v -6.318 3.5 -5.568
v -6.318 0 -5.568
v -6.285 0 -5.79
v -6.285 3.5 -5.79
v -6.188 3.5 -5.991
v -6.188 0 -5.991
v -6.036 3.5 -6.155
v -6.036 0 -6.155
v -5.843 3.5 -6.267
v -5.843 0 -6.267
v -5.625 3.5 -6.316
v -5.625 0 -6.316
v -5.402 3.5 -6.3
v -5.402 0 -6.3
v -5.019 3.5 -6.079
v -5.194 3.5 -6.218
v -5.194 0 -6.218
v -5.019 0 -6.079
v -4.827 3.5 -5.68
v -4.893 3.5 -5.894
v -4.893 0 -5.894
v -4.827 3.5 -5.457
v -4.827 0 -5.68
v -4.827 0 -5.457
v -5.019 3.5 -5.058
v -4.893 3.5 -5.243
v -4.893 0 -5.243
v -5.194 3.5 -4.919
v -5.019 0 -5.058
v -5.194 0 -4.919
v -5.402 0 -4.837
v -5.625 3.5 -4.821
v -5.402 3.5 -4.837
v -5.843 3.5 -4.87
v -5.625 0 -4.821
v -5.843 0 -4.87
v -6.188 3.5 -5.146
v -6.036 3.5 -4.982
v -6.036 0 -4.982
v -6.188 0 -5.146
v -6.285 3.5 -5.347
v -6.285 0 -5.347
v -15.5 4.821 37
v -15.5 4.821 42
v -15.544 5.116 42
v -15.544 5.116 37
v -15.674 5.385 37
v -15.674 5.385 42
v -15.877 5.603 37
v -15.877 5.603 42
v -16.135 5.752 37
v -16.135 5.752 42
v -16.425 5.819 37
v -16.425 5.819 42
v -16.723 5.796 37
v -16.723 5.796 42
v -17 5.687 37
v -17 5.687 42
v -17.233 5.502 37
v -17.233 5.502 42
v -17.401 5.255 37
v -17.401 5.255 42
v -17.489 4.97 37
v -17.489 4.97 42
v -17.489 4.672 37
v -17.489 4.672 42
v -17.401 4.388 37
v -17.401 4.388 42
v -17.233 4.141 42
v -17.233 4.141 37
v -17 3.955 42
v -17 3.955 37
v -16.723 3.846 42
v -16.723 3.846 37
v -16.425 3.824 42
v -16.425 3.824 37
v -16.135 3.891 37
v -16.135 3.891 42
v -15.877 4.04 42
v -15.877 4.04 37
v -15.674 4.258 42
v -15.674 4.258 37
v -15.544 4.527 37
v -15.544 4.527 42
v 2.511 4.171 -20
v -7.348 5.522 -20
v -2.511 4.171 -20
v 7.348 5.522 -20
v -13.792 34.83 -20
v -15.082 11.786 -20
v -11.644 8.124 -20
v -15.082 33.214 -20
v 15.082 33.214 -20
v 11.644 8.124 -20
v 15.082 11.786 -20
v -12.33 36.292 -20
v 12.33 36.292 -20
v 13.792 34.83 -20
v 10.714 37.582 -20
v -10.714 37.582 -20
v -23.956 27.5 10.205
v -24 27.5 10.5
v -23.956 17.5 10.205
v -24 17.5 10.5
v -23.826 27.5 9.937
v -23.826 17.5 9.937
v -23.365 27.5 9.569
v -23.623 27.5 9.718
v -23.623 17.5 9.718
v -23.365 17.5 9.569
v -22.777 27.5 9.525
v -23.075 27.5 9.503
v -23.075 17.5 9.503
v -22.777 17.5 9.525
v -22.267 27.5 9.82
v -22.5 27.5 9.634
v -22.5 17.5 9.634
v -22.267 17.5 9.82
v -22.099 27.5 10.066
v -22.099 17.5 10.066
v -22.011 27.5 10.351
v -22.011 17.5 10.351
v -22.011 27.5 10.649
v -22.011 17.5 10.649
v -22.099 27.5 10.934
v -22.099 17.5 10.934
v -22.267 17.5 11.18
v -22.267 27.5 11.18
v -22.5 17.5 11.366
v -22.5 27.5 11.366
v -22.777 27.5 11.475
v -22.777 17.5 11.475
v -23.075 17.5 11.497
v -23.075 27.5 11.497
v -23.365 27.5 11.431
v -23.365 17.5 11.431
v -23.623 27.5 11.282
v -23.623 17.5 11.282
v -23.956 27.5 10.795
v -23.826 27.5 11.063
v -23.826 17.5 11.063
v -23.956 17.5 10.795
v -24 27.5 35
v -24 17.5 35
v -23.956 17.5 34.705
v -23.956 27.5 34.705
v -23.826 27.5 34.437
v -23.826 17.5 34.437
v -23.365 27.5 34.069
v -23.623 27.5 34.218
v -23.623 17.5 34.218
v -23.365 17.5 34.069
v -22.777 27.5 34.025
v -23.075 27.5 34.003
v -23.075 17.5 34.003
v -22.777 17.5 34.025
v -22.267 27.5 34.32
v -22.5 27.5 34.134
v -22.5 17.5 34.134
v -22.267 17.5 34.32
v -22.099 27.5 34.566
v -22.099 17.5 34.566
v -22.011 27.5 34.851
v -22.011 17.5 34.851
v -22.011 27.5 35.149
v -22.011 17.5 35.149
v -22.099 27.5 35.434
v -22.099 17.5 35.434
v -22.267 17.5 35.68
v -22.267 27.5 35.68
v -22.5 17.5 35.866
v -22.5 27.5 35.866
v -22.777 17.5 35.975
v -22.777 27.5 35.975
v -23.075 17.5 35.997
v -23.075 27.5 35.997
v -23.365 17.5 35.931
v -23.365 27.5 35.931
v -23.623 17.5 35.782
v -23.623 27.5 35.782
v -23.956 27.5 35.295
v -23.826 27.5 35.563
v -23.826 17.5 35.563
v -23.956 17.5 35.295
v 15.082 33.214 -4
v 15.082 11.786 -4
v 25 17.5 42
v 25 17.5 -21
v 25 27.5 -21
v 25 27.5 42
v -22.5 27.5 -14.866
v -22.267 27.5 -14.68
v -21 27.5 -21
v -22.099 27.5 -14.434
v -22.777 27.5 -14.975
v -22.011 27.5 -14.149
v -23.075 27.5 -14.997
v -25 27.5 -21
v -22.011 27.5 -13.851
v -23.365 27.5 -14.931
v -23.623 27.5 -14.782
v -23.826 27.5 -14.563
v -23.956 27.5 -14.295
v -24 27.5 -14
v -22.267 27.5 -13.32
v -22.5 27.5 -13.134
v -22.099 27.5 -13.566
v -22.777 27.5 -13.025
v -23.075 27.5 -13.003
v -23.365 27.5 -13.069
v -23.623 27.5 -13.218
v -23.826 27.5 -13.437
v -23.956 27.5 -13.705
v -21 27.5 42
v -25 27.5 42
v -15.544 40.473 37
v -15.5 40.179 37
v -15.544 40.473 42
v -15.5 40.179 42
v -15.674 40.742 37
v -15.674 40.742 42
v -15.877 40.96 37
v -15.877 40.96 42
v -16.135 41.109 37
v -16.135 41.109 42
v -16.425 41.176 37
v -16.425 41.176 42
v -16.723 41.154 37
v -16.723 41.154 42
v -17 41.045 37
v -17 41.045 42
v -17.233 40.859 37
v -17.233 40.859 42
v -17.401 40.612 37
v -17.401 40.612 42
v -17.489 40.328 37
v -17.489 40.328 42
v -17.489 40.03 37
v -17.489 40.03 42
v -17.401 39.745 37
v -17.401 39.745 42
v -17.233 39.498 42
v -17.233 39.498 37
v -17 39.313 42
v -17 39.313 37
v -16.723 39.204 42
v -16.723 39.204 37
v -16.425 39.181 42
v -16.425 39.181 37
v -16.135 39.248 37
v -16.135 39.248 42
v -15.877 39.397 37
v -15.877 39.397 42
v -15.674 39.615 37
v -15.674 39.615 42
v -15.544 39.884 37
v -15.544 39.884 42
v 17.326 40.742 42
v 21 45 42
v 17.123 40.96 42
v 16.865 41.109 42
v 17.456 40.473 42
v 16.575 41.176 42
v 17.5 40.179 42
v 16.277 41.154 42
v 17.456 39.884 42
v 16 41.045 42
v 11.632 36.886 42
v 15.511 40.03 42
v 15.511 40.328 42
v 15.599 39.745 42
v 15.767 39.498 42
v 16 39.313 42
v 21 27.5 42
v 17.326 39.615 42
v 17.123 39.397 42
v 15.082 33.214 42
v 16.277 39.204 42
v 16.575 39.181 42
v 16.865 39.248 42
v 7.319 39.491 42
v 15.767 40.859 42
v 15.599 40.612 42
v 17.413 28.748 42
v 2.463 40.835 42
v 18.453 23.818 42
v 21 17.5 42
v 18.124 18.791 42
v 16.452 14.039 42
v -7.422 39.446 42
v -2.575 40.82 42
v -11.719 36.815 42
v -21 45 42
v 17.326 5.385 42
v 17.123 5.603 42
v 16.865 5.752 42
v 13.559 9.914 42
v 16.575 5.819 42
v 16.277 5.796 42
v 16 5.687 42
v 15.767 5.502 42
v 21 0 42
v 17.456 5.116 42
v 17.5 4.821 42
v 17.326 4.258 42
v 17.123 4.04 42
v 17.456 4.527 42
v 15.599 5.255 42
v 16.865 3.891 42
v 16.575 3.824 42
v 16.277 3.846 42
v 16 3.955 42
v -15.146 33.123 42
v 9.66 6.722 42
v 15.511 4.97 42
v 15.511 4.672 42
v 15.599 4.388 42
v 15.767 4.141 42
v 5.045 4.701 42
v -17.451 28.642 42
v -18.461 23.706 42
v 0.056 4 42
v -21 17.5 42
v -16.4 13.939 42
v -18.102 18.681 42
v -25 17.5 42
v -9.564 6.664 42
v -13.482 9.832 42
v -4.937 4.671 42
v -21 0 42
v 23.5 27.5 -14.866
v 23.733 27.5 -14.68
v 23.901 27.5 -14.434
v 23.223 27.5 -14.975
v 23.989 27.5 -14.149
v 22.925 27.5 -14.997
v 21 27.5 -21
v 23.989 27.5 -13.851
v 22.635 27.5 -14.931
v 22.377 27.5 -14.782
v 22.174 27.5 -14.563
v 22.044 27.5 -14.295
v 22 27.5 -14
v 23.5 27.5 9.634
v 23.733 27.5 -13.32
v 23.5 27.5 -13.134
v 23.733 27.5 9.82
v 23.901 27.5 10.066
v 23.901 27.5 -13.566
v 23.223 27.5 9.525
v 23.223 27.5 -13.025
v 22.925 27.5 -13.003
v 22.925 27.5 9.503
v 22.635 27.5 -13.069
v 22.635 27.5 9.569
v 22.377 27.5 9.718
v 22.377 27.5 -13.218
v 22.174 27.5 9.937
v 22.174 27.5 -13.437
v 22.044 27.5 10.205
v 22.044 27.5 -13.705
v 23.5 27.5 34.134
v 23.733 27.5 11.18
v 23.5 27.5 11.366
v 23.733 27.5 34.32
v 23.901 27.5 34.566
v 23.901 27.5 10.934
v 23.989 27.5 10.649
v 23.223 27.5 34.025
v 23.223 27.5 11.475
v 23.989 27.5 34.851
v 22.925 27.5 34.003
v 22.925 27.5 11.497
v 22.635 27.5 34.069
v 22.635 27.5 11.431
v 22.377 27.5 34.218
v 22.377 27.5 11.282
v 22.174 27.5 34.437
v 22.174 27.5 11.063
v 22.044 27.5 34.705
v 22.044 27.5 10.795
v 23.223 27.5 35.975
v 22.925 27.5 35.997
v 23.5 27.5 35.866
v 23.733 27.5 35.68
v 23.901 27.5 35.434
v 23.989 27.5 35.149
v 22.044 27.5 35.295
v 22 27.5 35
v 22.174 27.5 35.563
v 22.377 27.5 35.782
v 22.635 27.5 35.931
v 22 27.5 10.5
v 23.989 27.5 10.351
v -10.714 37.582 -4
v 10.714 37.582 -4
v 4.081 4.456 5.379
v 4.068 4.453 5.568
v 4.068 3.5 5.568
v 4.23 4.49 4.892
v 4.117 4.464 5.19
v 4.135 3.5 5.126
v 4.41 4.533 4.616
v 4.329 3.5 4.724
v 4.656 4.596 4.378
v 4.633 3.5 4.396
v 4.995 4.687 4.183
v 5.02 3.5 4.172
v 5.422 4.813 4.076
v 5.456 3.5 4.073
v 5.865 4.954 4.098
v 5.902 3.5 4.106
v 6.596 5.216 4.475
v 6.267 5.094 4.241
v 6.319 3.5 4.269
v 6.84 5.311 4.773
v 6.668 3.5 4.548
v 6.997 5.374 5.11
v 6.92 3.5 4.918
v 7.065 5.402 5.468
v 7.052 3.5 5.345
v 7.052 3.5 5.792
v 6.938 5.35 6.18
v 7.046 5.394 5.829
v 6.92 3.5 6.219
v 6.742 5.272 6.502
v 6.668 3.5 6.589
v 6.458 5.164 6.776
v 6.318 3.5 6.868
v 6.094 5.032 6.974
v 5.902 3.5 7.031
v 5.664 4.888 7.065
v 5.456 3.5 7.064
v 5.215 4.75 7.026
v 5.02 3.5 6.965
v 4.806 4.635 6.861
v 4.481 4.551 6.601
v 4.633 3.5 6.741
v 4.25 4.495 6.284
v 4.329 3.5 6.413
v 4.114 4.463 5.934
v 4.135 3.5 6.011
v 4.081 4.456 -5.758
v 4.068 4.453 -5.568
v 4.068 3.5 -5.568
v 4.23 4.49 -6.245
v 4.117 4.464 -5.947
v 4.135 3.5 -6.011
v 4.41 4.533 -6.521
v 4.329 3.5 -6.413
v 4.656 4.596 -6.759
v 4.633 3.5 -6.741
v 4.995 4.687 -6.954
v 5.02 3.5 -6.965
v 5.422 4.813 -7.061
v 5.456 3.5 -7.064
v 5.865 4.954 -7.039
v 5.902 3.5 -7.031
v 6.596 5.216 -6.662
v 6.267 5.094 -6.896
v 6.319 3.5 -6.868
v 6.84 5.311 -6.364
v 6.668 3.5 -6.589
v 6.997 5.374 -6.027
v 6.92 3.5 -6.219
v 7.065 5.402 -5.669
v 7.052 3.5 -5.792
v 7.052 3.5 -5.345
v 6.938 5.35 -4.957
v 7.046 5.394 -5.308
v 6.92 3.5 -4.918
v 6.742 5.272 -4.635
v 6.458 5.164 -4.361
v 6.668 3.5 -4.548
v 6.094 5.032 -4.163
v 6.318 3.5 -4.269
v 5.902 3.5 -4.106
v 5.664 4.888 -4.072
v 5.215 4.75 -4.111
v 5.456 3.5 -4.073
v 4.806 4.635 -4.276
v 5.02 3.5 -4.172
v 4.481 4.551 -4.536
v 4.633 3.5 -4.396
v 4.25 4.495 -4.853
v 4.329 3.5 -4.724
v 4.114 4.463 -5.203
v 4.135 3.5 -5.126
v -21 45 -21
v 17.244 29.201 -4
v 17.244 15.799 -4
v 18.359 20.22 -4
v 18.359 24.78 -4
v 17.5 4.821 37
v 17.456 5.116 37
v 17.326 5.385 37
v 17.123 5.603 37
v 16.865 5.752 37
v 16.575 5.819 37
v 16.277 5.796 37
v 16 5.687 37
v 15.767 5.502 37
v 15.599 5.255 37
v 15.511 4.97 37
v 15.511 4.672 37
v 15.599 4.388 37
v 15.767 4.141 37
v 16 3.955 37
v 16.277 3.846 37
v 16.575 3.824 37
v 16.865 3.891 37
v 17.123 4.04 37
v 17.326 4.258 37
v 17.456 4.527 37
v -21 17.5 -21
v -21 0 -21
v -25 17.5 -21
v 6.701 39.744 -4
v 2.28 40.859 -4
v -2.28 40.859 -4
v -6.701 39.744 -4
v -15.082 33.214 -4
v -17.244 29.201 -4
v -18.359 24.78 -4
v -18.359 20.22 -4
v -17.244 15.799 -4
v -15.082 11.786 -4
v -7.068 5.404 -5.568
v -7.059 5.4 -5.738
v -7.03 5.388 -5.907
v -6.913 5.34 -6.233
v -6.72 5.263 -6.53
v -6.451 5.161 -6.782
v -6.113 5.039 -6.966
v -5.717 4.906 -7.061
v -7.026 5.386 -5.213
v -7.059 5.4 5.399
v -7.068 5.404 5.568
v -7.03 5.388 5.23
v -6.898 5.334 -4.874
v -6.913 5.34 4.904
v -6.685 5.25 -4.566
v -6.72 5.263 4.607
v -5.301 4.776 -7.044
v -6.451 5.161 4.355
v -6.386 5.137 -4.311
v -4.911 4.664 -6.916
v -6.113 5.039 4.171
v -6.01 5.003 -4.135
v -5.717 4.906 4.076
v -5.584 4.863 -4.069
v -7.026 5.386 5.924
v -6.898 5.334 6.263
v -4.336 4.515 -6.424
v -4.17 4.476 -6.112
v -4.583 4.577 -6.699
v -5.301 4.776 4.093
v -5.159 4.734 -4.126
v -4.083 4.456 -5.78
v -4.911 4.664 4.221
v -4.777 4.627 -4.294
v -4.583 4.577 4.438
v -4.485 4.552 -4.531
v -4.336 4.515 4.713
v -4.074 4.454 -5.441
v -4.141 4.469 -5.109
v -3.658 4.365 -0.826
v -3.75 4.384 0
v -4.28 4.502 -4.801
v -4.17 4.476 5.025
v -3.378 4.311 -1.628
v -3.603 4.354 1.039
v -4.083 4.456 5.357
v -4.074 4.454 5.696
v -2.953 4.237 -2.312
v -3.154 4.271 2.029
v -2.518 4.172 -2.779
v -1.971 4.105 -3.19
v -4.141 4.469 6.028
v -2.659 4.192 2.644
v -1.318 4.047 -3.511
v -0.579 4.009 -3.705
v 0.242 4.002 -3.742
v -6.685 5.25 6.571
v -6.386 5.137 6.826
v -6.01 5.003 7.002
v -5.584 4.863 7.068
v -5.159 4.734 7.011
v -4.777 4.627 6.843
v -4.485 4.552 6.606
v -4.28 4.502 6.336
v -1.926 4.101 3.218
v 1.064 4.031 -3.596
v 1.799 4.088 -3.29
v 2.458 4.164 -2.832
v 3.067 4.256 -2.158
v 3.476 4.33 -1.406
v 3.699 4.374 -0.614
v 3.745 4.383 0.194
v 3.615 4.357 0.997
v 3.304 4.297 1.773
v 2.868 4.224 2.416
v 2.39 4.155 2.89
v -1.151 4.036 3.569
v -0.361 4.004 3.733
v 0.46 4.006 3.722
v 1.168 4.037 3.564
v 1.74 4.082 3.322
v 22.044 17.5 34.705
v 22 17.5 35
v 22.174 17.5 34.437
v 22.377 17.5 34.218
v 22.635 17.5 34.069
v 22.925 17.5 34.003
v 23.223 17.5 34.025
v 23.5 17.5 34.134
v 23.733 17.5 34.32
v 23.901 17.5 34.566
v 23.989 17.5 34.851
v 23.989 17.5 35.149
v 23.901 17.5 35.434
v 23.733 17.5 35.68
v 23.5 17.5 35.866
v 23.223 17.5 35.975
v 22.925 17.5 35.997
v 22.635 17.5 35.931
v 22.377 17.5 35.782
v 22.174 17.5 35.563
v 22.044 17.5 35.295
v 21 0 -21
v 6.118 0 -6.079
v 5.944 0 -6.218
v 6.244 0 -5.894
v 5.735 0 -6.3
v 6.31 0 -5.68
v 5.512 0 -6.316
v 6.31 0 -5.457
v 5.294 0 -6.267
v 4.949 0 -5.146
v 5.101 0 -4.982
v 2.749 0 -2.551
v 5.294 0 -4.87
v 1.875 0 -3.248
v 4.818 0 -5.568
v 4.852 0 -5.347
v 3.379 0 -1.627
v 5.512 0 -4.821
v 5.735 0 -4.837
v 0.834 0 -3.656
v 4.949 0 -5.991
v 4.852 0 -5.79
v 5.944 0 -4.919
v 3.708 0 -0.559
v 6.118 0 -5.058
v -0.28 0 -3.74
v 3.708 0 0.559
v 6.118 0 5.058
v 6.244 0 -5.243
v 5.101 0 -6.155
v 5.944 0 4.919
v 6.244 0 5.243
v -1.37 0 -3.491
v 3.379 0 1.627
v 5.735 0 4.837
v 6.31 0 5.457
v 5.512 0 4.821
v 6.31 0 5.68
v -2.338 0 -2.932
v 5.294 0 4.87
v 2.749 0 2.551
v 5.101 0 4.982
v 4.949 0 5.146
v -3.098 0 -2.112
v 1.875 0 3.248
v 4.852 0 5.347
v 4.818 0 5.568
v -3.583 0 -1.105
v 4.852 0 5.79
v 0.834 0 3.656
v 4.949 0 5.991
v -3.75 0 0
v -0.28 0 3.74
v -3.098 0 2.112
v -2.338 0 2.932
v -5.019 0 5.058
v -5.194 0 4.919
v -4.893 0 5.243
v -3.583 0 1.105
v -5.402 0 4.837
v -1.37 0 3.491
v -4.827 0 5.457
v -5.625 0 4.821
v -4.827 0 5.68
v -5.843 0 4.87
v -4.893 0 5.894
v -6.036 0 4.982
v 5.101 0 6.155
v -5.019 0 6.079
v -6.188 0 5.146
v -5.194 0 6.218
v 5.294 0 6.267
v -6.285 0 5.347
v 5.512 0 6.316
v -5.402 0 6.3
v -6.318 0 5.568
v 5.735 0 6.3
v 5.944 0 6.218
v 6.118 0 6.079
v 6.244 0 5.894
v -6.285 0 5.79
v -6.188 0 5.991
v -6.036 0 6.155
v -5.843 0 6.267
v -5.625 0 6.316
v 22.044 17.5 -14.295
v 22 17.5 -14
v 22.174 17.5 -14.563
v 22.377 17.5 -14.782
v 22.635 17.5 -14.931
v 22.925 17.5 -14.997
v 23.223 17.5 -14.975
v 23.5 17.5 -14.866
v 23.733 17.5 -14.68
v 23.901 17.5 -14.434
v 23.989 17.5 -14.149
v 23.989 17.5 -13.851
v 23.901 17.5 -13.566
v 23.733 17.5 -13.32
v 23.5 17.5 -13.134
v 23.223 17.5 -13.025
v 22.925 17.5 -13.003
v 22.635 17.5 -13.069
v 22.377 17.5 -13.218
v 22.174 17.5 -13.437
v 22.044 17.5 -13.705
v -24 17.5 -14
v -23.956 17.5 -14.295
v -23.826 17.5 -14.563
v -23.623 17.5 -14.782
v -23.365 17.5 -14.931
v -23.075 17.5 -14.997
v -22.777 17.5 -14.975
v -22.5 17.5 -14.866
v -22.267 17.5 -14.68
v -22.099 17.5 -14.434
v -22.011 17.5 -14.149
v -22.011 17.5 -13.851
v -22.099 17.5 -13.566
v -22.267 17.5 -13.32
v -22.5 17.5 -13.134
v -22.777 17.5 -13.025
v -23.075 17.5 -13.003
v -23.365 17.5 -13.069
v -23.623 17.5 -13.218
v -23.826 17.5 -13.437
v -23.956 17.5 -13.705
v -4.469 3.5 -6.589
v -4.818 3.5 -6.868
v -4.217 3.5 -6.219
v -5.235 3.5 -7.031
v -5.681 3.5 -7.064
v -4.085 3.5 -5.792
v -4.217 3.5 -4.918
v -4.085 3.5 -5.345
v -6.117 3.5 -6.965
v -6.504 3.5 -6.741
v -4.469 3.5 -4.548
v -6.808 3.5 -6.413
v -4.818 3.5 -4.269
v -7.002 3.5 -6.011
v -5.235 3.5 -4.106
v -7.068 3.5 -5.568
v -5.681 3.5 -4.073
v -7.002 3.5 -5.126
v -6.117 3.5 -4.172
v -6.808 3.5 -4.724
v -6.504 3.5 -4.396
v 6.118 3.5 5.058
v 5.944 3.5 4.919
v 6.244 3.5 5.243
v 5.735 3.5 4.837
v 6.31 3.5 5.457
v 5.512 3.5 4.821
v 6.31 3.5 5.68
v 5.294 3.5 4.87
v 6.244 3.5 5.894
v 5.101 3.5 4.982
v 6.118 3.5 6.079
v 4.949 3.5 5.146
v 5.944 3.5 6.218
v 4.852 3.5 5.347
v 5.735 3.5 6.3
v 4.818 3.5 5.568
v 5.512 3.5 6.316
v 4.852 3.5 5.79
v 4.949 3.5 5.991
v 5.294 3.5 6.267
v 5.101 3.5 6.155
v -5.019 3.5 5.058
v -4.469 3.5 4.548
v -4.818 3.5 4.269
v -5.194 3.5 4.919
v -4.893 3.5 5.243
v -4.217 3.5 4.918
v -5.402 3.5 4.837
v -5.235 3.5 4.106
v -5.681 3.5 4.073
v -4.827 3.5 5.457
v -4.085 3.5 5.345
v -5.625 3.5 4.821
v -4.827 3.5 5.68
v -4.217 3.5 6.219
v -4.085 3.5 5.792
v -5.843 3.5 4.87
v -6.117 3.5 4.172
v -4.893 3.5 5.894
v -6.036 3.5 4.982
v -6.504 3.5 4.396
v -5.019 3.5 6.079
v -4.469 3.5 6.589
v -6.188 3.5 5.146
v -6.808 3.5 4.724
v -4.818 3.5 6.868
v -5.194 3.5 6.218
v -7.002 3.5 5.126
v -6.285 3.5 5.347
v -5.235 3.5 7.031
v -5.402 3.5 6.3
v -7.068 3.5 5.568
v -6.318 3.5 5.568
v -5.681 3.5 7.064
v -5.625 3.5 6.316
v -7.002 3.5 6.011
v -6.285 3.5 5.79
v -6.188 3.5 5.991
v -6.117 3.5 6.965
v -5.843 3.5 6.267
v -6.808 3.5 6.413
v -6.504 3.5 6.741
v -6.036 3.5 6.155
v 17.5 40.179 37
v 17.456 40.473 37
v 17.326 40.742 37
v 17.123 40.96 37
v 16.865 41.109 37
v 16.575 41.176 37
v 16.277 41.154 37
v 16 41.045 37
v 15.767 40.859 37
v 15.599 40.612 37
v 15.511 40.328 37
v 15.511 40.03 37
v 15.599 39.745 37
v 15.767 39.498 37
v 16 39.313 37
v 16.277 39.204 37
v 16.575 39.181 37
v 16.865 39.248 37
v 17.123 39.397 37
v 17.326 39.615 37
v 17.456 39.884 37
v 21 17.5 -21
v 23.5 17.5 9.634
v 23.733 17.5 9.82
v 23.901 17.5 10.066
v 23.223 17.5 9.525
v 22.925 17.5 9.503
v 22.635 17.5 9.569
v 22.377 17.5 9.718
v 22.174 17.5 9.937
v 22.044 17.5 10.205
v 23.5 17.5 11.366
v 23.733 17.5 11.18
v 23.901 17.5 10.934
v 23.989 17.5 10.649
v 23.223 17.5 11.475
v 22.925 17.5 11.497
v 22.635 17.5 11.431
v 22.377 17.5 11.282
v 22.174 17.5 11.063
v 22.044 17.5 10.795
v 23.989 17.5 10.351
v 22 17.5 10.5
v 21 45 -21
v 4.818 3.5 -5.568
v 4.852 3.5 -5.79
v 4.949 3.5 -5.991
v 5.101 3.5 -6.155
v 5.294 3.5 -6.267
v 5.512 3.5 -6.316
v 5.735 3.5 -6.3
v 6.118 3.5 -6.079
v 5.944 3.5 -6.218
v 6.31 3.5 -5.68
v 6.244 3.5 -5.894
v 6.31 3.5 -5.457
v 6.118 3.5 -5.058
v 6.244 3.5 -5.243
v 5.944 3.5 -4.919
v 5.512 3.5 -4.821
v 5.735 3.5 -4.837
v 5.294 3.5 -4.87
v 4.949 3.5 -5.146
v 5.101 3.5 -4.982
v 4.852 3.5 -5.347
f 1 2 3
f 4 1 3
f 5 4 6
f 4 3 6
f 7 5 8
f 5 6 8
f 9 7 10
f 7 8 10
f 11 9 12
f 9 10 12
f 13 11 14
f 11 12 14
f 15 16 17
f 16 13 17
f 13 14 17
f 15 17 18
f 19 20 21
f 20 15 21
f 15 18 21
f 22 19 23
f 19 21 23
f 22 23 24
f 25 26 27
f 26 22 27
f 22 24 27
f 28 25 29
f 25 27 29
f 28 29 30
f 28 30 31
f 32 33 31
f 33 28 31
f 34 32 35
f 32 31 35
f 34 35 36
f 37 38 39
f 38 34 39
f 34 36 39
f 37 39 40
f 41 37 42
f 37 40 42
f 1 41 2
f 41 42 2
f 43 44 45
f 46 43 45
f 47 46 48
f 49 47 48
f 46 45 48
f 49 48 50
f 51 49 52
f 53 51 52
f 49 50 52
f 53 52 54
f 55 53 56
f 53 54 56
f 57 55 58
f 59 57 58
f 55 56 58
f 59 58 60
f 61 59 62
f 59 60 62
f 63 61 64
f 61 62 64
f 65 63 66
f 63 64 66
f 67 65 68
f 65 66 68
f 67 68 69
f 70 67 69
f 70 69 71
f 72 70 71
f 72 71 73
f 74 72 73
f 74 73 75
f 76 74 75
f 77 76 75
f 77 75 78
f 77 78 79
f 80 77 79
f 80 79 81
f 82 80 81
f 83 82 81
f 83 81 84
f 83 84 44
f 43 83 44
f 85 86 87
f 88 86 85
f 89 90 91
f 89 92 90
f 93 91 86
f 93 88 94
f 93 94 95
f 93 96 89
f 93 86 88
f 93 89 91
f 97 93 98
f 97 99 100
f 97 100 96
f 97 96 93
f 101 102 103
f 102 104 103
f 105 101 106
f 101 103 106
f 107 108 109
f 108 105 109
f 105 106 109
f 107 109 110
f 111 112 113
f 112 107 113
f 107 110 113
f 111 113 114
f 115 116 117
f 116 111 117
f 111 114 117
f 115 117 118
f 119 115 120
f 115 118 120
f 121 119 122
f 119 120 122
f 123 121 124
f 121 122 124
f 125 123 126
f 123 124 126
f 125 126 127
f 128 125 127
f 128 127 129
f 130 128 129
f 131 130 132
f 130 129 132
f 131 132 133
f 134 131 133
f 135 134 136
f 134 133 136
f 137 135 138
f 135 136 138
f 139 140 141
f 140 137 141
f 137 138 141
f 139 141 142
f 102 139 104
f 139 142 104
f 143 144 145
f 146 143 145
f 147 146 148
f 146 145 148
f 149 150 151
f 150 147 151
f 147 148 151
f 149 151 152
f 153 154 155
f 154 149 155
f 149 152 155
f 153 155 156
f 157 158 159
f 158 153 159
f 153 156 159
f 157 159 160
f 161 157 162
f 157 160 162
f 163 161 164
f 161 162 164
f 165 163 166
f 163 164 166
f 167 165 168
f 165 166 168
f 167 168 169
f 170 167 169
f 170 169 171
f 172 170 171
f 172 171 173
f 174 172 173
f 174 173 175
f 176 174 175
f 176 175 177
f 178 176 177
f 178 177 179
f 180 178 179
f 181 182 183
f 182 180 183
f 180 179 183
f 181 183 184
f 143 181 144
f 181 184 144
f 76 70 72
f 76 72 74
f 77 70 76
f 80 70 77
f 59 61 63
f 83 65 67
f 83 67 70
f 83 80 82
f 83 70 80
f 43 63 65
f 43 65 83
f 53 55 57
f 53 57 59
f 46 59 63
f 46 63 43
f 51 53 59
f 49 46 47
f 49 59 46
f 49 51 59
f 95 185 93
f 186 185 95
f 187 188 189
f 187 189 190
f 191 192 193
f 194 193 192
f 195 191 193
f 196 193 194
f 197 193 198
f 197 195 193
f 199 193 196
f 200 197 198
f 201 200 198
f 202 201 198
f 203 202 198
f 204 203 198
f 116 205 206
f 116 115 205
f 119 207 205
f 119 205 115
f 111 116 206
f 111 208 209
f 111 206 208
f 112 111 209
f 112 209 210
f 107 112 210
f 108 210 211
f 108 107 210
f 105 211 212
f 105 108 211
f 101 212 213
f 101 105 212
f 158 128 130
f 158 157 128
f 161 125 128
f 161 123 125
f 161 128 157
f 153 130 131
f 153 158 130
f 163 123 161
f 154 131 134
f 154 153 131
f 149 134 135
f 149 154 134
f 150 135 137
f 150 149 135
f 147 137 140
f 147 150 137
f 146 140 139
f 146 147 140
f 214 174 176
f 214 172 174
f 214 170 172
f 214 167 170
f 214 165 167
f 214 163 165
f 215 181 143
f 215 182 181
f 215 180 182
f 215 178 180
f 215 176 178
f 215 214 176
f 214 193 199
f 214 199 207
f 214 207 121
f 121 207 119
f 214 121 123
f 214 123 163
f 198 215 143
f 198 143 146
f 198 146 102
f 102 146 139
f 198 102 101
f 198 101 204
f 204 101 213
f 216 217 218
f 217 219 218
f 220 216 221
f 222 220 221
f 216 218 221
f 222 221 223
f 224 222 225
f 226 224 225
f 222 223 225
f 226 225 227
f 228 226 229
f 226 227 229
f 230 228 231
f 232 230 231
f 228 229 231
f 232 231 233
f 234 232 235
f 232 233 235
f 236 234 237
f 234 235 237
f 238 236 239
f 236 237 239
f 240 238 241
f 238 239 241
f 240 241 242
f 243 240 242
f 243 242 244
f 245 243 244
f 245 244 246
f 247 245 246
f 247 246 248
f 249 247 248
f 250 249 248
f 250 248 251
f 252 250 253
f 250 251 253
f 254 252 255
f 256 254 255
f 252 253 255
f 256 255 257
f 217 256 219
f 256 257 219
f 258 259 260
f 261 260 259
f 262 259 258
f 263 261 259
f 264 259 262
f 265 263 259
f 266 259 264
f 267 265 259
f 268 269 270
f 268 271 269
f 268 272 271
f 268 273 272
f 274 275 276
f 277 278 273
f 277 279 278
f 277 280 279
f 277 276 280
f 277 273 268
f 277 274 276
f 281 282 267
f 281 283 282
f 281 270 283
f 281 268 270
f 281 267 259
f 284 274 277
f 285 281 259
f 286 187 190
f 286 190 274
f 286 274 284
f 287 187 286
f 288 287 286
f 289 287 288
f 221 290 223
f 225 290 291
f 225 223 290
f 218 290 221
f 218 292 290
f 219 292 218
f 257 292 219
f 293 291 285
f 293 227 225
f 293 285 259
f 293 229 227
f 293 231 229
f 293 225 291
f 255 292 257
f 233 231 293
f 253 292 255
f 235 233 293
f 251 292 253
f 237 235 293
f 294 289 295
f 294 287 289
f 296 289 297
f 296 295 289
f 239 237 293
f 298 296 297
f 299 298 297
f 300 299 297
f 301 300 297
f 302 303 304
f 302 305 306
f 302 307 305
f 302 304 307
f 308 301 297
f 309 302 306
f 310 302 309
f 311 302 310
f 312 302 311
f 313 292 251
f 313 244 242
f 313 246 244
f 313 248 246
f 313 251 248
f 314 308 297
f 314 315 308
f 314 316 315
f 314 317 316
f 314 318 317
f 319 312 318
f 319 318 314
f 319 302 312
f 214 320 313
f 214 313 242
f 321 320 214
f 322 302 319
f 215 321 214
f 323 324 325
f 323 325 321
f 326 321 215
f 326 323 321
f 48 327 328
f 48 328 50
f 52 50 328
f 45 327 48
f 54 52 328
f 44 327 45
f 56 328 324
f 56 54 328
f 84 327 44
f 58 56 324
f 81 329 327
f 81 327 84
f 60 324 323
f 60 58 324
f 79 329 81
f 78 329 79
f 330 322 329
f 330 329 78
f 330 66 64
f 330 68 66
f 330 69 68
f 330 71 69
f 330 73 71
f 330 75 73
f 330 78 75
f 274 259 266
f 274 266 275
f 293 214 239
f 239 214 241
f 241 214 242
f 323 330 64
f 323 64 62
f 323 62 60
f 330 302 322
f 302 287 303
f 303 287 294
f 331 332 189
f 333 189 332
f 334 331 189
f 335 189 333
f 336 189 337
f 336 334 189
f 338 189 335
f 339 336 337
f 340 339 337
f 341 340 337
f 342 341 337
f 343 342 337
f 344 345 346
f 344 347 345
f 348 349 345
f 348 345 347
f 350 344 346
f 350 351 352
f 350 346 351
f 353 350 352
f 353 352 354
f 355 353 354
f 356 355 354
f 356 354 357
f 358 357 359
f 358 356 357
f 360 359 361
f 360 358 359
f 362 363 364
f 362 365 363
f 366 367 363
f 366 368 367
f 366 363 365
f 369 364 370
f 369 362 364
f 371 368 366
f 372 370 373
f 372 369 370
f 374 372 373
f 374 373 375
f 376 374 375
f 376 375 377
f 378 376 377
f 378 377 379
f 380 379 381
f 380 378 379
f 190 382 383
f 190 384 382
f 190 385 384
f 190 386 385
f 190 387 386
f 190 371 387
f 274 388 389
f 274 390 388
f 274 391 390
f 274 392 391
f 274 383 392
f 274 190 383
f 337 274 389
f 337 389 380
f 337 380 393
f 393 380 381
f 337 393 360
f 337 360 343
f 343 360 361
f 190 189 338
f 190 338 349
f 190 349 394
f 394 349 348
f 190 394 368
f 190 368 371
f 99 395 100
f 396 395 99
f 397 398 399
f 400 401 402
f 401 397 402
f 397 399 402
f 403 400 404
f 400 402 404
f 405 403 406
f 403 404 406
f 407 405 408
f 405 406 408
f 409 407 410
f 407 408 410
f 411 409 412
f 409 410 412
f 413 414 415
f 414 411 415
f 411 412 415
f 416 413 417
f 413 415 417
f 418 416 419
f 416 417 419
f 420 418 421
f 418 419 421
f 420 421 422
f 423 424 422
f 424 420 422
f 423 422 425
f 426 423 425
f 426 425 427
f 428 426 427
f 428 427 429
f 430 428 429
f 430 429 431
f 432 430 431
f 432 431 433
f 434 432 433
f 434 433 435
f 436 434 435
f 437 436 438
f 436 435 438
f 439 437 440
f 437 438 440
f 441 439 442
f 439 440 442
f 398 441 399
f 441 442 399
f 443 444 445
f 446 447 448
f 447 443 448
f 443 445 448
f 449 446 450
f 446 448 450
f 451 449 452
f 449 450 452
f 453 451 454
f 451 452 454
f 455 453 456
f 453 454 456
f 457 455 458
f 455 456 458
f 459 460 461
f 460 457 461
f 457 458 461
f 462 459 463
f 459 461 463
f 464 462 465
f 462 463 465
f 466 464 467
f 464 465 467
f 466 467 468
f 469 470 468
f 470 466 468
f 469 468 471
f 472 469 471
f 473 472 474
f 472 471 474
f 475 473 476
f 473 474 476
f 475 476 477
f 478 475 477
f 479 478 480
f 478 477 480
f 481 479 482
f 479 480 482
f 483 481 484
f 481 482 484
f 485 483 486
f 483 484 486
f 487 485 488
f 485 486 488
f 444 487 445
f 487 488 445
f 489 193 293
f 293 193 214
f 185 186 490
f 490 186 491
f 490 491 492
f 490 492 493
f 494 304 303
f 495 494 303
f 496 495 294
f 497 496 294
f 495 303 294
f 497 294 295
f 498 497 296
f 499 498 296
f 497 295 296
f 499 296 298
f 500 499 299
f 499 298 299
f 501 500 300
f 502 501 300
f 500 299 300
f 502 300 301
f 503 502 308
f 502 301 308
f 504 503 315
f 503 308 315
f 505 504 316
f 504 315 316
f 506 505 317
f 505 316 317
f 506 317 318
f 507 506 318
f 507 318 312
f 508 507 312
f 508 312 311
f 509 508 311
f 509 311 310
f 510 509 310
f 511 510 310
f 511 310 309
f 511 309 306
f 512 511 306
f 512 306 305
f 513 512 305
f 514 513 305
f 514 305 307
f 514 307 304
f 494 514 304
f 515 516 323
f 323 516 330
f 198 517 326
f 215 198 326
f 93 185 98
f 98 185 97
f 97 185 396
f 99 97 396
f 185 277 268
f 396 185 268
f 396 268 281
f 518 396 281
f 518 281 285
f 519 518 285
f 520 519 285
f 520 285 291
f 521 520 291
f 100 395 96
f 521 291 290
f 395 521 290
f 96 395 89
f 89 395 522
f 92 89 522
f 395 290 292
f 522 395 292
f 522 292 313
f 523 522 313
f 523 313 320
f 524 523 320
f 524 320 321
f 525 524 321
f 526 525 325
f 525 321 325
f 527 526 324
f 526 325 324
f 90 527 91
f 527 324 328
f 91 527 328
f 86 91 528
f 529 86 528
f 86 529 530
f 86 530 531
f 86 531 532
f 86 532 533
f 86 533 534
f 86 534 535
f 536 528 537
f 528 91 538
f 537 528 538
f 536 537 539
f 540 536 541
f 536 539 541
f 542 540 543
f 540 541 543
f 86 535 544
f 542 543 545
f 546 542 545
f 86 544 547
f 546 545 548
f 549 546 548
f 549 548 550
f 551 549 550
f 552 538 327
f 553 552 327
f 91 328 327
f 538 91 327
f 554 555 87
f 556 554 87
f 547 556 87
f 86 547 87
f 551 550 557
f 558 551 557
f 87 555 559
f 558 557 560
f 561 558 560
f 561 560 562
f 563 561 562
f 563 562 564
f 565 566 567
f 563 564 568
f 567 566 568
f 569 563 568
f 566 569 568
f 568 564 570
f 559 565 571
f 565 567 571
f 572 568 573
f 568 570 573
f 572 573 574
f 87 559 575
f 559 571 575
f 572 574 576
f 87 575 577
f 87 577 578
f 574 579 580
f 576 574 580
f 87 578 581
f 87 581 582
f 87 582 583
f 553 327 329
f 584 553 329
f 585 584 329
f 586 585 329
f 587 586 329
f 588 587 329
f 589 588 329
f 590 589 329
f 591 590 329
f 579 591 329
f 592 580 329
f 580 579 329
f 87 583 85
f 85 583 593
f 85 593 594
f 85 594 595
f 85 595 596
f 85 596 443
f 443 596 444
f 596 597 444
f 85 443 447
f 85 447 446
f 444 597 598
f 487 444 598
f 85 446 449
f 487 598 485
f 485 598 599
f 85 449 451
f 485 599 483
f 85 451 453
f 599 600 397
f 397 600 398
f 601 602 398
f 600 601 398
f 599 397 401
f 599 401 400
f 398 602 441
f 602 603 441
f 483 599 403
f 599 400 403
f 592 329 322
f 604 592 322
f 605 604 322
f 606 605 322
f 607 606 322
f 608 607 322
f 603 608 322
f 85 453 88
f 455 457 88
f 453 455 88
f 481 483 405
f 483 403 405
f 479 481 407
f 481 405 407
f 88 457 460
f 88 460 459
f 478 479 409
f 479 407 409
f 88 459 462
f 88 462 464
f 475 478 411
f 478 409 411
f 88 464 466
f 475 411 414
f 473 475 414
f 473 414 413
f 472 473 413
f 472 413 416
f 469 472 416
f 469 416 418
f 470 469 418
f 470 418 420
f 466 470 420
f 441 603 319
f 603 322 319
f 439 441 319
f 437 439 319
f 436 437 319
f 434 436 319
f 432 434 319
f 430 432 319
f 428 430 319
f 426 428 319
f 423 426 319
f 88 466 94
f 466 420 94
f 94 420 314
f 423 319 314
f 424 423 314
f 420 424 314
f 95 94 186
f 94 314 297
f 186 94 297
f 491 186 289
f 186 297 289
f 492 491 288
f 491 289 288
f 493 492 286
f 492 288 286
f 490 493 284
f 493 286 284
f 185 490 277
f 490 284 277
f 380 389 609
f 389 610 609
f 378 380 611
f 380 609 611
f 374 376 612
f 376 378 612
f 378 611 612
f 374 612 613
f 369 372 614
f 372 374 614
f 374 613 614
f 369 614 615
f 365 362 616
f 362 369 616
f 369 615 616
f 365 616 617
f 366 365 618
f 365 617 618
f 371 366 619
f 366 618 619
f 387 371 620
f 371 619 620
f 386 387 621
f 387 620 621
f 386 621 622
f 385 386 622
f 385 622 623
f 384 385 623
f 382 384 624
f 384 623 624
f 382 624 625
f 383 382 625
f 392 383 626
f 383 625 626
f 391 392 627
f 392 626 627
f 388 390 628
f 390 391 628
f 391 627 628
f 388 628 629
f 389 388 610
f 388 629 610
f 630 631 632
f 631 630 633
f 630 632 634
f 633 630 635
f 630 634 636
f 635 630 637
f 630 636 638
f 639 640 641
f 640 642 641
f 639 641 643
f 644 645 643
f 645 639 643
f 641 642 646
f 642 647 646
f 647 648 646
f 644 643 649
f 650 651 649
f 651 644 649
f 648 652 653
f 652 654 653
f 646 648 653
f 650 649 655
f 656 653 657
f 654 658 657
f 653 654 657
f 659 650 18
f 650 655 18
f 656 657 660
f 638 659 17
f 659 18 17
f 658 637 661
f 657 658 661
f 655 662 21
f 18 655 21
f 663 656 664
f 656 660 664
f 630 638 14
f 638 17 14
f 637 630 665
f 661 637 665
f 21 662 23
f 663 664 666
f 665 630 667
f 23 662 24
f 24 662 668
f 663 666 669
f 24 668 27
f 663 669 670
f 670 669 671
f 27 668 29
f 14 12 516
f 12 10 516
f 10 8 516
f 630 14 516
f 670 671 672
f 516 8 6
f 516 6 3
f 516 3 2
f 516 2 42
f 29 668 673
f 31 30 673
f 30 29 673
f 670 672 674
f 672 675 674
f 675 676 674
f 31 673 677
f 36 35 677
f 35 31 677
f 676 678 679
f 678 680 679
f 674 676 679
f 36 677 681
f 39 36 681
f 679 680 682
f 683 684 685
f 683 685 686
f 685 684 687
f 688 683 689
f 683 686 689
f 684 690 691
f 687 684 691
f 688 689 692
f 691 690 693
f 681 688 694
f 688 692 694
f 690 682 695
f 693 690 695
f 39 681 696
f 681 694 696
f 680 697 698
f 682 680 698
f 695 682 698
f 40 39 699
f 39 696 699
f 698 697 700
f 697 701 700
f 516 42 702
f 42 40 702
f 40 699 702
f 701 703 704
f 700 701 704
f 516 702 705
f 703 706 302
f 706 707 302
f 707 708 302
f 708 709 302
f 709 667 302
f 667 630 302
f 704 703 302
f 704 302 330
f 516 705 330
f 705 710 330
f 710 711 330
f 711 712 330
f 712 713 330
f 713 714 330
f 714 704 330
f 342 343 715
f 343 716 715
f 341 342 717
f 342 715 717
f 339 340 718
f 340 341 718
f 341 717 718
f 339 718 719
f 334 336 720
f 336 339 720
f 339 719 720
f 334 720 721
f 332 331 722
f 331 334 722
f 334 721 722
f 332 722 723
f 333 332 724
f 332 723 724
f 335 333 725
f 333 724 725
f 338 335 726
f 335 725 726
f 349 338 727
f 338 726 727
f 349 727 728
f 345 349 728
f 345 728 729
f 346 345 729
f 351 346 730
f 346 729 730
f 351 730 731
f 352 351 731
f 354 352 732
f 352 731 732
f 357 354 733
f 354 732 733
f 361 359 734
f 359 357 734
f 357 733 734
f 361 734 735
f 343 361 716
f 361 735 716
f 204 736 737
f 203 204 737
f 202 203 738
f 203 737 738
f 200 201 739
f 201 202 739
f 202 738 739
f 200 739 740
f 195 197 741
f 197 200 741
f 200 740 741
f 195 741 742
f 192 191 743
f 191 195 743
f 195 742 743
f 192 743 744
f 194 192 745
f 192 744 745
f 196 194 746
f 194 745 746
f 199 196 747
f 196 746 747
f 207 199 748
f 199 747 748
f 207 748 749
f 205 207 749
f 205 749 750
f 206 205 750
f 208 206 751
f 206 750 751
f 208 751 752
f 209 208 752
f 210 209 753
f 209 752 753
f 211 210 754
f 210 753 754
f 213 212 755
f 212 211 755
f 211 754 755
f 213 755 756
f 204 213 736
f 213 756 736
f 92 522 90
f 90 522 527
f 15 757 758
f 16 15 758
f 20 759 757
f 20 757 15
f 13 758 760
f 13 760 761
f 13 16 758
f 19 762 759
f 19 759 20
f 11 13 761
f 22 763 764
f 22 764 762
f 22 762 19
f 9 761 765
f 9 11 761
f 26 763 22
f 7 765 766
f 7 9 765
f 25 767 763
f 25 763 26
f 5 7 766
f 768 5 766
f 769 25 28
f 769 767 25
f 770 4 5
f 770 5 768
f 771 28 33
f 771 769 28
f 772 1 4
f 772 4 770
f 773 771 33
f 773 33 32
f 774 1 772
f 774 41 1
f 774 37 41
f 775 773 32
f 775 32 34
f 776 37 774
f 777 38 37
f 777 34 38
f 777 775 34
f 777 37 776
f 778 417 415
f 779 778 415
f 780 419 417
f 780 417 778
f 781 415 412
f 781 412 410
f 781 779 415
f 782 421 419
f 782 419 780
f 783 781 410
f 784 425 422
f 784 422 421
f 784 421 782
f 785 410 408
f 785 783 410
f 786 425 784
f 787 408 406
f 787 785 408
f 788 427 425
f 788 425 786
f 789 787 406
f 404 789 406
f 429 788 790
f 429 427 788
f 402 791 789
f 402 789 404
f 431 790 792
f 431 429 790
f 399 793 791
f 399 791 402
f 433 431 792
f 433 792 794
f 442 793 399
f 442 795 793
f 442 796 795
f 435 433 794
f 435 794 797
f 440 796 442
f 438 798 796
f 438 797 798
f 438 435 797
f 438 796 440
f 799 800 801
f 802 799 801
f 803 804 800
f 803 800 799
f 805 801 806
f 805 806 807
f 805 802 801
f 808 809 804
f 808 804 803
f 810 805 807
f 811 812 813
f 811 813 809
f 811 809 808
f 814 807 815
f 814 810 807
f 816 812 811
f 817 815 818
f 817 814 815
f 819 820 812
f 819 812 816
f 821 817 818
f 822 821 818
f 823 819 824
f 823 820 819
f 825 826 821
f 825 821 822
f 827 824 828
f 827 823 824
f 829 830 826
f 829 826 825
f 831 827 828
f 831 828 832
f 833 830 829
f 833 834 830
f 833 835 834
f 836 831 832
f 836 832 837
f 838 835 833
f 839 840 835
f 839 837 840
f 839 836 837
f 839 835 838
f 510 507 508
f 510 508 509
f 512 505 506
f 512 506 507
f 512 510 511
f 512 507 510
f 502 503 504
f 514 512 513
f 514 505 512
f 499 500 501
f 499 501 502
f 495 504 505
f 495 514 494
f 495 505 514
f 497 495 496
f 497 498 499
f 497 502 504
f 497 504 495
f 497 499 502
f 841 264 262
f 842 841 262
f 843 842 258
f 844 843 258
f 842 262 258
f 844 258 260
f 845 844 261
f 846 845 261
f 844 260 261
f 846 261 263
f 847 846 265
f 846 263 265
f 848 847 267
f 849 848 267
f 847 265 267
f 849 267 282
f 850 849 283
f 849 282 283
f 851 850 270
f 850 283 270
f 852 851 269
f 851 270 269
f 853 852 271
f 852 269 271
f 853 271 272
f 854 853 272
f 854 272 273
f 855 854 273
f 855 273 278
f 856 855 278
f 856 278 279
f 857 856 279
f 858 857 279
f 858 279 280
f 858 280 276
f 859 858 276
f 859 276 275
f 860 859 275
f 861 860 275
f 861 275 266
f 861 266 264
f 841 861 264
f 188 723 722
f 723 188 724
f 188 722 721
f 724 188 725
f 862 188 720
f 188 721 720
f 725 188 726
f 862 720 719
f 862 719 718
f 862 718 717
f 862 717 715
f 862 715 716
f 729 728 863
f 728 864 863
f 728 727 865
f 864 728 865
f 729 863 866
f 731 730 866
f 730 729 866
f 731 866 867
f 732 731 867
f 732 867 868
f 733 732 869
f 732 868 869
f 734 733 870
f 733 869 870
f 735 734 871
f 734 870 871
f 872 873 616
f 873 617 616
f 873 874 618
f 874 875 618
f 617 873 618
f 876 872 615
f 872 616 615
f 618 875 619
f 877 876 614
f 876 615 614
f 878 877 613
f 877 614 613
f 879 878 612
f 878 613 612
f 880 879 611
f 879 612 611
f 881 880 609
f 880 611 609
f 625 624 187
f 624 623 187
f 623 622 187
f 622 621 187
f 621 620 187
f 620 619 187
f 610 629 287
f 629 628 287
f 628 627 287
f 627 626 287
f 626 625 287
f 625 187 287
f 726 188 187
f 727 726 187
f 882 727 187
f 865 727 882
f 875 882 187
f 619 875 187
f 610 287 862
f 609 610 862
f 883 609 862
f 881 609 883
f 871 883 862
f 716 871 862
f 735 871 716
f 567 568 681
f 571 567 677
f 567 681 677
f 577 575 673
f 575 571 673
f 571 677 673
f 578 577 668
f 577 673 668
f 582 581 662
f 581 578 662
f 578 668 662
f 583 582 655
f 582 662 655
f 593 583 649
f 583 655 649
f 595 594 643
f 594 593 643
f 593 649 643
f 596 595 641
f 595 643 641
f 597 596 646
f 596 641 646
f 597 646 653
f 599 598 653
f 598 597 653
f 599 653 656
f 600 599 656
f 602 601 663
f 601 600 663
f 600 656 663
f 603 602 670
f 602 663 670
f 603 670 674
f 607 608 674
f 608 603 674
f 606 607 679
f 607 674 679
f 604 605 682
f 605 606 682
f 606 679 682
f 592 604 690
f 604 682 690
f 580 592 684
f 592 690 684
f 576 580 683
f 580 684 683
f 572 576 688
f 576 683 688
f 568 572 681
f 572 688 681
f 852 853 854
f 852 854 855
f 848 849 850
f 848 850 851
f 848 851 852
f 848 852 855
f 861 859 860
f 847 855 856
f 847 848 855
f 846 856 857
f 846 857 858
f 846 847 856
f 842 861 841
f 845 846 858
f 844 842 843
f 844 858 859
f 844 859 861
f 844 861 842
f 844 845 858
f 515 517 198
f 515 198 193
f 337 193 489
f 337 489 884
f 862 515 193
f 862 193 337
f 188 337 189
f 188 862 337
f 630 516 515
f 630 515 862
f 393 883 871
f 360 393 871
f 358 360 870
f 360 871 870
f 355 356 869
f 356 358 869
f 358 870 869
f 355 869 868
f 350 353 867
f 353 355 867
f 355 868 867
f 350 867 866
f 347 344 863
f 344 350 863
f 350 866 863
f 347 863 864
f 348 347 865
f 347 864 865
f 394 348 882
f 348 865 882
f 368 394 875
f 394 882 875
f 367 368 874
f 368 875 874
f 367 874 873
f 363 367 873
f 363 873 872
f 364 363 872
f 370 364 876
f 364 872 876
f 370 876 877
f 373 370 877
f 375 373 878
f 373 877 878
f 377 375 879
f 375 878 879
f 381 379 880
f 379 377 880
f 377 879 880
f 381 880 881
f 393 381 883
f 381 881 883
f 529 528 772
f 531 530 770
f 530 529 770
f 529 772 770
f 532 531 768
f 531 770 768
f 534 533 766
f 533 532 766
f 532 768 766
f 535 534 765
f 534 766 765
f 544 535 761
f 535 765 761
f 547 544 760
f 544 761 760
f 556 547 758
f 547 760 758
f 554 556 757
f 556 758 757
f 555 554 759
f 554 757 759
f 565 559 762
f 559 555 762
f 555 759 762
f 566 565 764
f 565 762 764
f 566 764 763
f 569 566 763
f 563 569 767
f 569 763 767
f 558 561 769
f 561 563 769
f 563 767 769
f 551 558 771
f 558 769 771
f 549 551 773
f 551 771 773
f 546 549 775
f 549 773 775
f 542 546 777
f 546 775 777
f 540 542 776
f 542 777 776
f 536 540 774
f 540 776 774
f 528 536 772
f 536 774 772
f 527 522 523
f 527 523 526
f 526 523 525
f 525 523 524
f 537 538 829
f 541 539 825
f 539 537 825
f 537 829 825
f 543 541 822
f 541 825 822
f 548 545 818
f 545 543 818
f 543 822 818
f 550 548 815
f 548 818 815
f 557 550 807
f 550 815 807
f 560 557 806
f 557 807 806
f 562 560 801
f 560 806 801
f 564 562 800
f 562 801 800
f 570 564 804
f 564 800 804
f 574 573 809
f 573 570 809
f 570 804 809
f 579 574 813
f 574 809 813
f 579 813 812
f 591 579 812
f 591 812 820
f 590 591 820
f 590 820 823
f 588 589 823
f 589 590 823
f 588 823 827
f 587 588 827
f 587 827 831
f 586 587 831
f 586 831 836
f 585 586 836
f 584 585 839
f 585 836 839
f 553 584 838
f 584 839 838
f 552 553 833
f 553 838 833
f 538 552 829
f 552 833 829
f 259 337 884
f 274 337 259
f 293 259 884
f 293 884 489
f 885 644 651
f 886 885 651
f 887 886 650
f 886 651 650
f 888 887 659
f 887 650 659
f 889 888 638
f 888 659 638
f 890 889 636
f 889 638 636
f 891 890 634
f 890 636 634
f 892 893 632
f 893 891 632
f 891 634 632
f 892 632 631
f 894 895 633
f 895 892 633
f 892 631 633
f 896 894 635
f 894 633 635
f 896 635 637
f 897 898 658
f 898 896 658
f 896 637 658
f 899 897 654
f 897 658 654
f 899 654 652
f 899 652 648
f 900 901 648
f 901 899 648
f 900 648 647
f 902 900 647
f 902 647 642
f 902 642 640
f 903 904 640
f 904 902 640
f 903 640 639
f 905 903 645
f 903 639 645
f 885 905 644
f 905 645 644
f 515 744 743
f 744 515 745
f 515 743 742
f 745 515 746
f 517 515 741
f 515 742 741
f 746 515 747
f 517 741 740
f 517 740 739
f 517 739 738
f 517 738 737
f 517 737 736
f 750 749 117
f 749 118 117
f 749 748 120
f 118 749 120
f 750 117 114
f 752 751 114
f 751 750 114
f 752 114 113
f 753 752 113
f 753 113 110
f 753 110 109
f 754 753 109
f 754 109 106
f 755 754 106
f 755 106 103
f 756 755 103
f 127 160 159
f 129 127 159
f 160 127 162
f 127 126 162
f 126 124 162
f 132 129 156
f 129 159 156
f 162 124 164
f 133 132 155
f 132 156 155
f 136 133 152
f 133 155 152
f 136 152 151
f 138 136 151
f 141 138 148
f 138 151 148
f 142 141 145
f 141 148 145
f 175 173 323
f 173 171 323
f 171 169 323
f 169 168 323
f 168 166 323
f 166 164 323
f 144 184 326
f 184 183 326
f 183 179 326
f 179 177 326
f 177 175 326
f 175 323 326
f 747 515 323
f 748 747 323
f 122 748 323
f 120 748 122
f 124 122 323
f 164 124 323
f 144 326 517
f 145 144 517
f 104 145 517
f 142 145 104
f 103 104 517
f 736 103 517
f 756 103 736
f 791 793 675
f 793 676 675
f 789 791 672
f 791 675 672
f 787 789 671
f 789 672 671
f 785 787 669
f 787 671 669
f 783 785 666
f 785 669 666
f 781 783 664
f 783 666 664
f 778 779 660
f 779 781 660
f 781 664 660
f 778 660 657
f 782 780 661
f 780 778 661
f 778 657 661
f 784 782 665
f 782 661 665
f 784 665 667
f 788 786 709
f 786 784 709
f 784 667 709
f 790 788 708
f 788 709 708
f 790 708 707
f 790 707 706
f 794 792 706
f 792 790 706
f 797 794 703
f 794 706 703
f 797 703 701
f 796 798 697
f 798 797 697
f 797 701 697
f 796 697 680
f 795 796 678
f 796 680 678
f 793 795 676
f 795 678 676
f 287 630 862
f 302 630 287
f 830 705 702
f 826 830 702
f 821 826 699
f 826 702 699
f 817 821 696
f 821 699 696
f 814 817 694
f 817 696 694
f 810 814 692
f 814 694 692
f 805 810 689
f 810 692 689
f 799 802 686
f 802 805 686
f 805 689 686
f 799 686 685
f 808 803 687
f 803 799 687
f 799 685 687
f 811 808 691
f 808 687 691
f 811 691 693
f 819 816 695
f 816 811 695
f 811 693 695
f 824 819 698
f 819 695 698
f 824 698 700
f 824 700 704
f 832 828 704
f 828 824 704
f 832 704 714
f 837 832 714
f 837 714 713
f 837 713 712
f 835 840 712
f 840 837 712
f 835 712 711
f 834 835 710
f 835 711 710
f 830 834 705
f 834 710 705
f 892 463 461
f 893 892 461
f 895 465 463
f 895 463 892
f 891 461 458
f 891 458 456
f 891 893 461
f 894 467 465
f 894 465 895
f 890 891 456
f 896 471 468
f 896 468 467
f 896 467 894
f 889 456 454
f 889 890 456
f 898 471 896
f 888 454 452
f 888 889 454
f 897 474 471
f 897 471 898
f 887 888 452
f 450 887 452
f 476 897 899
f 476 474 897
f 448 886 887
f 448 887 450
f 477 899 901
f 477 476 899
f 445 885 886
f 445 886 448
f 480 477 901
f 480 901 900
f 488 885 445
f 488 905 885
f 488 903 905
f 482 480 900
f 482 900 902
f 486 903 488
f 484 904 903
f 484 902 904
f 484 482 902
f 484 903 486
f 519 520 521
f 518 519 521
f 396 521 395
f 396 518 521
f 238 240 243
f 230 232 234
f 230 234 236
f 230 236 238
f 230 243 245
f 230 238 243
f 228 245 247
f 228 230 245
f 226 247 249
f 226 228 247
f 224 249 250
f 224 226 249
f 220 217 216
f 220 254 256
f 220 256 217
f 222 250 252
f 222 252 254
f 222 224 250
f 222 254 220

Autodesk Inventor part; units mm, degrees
ref_plane "YZ Plane" through (0, 0, 0) normal (1, 0, 0) x (0, 1, 0)
ref_plane "XZ Plane" through (0, 0, 0) normal (0, 1, 0) x (-1, 0, 0)
ref_plane "XY Plane" through (0, 0, 0) normal (0, 0, 1) x (1, 0, 0)
sketch "Sketch1" plane through (0, 0, 0) normal (0, 1, 0) x (-1, 0, 0)
  circle A0 centre (0, 0) radius 11 construction
  circle A1 centre (0, 0) radius 3.75
  circle A2 centre (0, 0) radius 7.875 construction
  line L0 (16.292, 0) -> (-19, 0) construction
  line L1 (0, 21) -> (0, -27.3544) construction
  line L2 (0, -21) -> (21, -21)
  line L3 (0, -21) -> (-21, -21)
  line L4 (0, 0) -> (21, -21) construction
  circle A3 centre (5.5685, -5.5685) radius 0.75
  circle A4 centre (-5.5685, -5.5685) radius 0.75
  circle A5 centre (5.5685, 5.5685) radius 0.75
  circle A6 centre (-5.5685, 5.5685) radius 0.75
  line L5 (-25, -21) -> (-21, -21)
  line L6 (25, -21) -> (21, -21)
  circle A7 centre (23, -14) radius 1
  circle A8 centre (-23, -14) radius 1
  line L7 (-25, 42) -> (25, 42)
  line L8 (25, -21) -> (25, 42)
  line L9 (21, -21) -> (21, 42)
  line L10 (-21, -21) -> (-21, 42)
  line L11 (-25, -21) -> (-25, 42)
  line L12 (25, 10.5) -> (-25, 10.5) construction
  circle A9 centre (23, 35) radius 1
  circle A10 centre (-23, 35) radius 1
  circle A11 centre (23, 10.5) radius 1
  circle A12 centre (-23, 10.5) radius 1
  circle A13 centre (5.5685, 5.5685) radius 1.5
  circle A14 centre (5.5685, -5.5685) radius 1.5
  circle A15 centre (-5.5685, 5.5685) radius 1.5
  circle A16 centre (-5.5685, -5.5685) radius 1.5
  dimension "d8" = 15.75
  dimension "d2" = 7.5
  dimension "d4" = 22
  dimension "d17" = 21
  dimension "d26" = 1.5
  dimension "d38" = 63
  dimension "d39" = 21
  dimension "d40" = 2
  dimension "d41" = 2
  dimension "d53" = 3
extrude "Extrusion9" add sketch "Sketch1" along normal blind 45 contours A1 | L3 L10 L7 L9 L2 | A3 | A4 | A5 | A6 | A13 | A14 | A15 | A16
extrude "Extrusion10" add sketch "Sketch1" along normal blind 27.5 contours L9 L7 L8 L6 | L5 L11 L7 L10
extrude "Extrusion11" cut sketch "Sketch1" along normal blind 17.5 contours L9 L7 L8 L6 | L5 L11 L7 L10
extrude "Extrusion13" cut sketch "Sketch1" along normal blind 6 contours A1 | A3 | A4 | A5 | A6 | A13 | A14 | A15 | A16
extrude "Extrusion15" add sketch "Sketch1" along normal blind 3.5 contours A13 | A14 | A15 | A16
sketch "Sketch5" plane through (-21, 45, 42) normal (0, 0, 1) x (1, 0, 0)
  line L0 (0, -45) -> (42, -45) construction
  line L1 (0, -17.5) -> (0, 0) construction
  line L2 (42, -45) -> (0, -45) construction
  line L3 (0, -45) -> (0, 0) construction
  line L4 (0, 0) -> (42, 0) construction
  line L5 (42, 0) -> (42, -45) construction
  line L6 (42, 0) -> (0, -45) construction
  line L7 (0, 0) -> (42, 0) construction
  line L8 (0, 0) -> (42, -45) construction
  circle A0 centre (21, -22.5) radius 18.5
  line L9 (-4, -27.5) -> (-4, -17.5) construction
  line L10 (-4, -22.5) -> (45.9746, -22.5) construction
  line L11 (-4, -23.5) -> (45.9746, -23.5) construction
  line L12 (45.9746, -23.5) -> (45.9746, -45) construction
  line L13 (45.9746, -45) -> (-4, -45) construction
  line L14 (-4, -45) -> (-4, -23.5) construction
  line L15 (-4, -21.5) -> (46, -21.5) construction
  line L16 (46, -21.5) -> (46, 0) construction
  line L17 (46, 0) -> (-4, 0) construction
  line L18 (-4, 0) -> (-4, -21.5) construction
  line L19 (-4, -21.5) -> (45.9746, -21.5) construction
  line L20 (45.9746, -21.5) -> (45.9746, -23.5) construction
  line L21 (45.9746, -23.5) -> (-4, -23.5) construction
  line L22 (-4, -23.5) -> (-4, -21.5) construction
  line L23 (10.2856, -7.4185) -> (31.7144, -7.4185)
  line L24 (5.9185, -11.7856) -> (5.9185, -33.2144)
  line L25 (36.0815, -11.7856) -> (36.0815, -33.2144)
  circle A1 centre (21, -22.5) radius 13.5 construction
  line L26 (21, -22.5) -> (38.8515, -22.5) construction
  line L27 (34.0815, -9.4185) -> (7.9185, -35.5815) construction
  line L28 (21, -45) -> (21, 0) construction
  line L29 (7.9185, -9.4185) -> (34.0815, -35.5815) construction
  line L30 (7.9185, -9.4185) -> (34.0815, -9.4185) construction
  line L31 (7.9185, -9.4185) -> (7.9185, -35.5815) construction
  line L32 (34.0815, -35.5815) -> (34.0815, -9.4185) construction
  circle A2 centre (4.5, -40.1786) radius 1
  circle A3 centre (37.5, -40.1786) radius 1
  circle A4 centre (4.5, -4.8214) radius 1
  circle A5 centre (37.5, -4.8214) radius 1
  dimension "d58" = 37
  dimension "d61" = 1
  dimension "d62" = 1
  dimension "d70" = 27
  dimension "d73" = 2
  dimension "d74" = 45
  dimension "d75" = 2
  dimension "d76" = 2
  dimension "d77" = 42
  dimension "d78" = 45
  dimension "d79" = 2
  dimension "d80" = 4.5
extrude "Extrusion16" cut sketch "Sketch5" against normal blind 62 contours L25 A0 L24 L23
extrude "Extrusion18" cut sketch "Sketch5" against normal blind 46 contours A0 L25 | L23 A0 | A0 L24
extrude "Extrusion19" cut sketch "Sketch5" against normal blind 5 contours A2 | A3 | A4 | A5
equation "\"d41\" = d40"
properties part number "engine_connector_sleeve"
